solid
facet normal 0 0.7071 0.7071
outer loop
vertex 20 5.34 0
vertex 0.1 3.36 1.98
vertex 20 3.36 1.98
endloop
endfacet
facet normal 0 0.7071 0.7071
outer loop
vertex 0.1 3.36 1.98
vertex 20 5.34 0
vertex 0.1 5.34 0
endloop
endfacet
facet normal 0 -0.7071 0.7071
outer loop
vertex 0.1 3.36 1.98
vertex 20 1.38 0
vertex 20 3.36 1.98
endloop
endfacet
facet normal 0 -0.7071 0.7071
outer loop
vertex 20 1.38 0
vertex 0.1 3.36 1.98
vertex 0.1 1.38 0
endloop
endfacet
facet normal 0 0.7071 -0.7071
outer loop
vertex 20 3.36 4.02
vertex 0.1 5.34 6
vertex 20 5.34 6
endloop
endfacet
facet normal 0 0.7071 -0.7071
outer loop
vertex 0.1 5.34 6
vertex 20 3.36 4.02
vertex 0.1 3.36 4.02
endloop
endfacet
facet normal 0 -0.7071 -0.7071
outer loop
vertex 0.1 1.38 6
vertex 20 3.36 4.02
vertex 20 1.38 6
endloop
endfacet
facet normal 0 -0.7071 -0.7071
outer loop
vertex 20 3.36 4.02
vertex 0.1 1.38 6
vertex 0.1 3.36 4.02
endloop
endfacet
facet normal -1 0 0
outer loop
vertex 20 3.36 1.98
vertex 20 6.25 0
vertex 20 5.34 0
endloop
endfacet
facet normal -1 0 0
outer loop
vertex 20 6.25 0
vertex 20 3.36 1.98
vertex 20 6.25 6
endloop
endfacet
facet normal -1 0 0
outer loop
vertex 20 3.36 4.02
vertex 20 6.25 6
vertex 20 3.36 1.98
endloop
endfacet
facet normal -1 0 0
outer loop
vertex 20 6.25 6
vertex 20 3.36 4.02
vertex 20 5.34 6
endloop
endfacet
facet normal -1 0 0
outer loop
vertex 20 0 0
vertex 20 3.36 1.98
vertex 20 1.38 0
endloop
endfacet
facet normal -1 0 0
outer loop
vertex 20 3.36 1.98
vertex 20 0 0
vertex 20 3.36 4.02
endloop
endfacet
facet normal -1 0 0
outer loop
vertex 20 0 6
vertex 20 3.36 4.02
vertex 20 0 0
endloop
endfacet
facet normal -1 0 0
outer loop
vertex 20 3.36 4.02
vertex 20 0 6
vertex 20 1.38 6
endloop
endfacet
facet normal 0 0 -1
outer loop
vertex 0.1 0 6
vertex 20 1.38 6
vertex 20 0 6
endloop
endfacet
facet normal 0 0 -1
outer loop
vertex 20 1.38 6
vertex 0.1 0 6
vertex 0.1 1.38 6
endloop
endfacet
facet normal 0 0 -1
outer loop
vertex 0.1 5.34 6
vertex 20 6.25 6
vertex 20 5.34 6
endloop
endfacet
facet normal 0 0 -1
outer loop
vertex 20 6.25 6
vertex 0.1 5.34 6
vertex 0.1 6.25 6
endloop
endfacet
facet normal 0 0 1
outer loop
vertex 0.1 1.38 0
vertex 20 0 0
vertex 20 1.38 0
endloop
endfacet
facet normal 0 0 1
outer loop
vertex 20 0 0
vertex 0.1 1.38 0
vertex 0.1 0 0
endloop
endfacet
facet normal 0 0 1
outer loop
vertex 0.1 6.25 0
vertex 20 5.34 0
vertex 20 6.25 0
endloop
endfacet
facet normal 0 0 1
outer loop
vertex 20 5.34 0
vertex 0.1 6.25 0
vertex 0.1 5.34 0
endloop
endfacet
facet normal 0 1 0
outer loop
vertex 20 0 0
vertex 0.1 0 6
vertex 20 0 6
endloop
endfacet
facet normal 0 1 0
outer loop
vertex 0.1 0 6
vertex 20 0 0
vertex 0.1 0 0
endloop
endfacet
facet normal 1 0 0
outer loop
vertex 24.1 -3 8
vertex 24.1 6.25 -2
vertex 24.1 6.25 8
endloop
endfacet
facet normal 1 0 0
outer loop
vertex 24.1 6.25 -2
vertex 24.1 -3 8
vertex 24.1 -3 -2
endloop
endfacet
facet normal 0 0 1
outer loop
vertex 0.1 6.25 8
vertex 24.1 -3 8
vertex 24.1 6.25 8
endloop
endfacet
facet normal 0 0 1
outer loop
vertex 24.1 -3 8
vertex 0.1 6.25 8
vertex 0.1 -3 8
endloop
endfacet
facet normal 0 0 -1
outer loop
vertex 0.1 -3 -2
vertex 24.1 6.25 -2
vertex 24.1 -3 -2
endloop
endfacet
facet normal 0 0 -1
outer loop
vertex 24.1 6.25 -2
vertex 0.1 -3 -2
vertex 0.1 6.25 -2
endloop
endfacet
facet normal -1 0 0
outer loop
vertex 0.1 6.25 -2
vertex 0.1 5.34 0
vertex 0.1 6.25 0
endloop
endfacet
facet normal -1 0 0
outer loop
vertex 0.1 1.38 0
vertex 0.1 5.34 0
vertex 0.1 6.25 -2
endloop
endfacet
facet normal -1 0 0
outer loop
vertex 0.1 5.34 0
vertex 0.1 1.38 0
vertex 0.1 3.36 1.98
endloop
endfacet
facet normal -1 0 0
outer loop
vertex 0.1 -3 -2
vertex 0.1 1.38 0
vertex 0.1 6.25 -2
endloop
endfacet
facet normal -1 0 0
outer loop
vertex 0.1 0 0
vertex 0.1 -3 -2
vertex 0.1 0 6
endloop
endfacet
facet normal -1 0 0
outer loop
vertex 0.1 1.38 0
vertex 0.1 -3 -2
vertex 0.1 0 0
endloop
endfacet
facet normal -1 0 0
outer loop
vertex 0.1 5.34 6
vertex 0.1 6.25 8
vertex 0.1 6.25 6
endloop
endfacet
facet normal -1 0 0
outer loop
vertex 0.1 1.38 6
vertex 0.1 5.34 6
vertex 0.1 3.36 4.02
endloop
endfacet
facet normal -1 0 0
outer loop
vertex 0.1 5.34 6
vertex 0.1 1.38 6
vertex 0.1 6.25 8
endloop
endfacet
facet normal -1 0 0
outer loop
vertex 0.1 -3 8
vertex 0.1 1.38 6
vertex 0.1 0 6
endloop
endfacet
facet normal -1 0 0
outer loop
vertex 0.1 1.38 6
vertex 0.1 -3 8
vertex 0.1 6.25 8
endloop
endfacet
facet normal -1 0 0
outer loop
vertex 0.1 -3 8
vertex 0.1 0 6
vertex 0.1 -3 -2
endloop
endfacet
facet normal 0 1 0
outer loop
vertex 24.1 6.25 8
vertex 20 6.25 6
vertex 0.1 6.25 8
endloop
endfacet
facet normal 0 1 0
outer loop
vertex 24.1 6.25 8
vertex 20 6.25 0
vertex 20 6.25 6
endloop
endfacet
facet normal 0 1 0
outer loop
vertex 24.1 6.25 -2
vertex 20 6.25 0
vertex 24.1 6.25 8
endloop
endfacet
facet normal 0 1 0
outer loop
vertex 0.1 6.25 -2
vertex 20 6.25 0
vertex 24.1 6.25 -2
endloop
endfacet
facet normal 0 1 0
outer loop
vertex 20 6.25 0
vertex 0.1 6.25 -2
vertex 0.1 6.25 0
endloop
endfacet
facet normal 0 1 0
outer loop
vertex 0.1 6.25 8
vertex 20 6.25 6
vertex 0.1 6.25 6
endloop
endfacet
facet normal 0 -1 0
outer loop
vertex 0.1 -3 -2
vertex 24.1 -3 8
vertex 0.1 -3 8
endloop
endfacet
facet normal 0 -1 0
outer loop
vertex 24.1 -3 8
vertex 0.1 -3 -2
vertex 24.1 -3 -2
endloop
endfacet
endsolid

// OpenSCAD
$fn = 32;
WIDTH = 6;
LENGTH = 4.75;

module pegSection() {
  $fn = 32;
  rotate([0, 0, 90])
      offset(r = 2.35)
        offset(-2.35) 
          square([WIDTH, LENGTH]);
}

module pegBend(angle = 90, tx = 1) {
  rotate_extrude(angle = angle)
    translate([-tx, 0, 0])
      pegSection();
}

difference() {
  union() {
    rotate([90, 0, 90])
      linear_extrude(1)
        pegSection();

    translate([0, 2, 0]) {
      pegBend(tx = 2);
     
      translate([-LENGTH - 1 - 1, 0, 0]) {
        rotate([90, 0, 180])
          linear_extrude(5)
            pegSection();
        
        translate([-1, 5, 0]) {
          *rotate([0, 0, 180])                 
            pegBend();
          
          *translate([0, 1, 0]) 
            rotate([90, 0, 270])
              linear_extrude(18)
                pegSection();
          
          translate([1 - 21, 1 + LENGTH / 2, 0]) 
            rotate([90, 0, 0]) {
              difference() {
                translate([0,0,4.375])
                linear_extrude(11)
                  pegSection();
               
                translate([-LENGTH / 2, -1, 6])
                  rotate([90, 90, 180])
                    linear_extrude(10) 
                      polygon([
                        [0, 0],
                        [-10, 3],
                        [-10, -3] 
                      ]);
              }
              
              difference() {
                union() {
                  translate([-0.1, WIDTH / 2, 12.4])     
                    sphere(1.5);
                  
                  translate([-LENGTH + 0.1, WIDTH / 2, 12.4])
                    sphere(1.5);
                }
                
                translate([-LENGTH / 2, -1, 6])
                  rotate([90, 90, 180])
                    linear_extrude(10) 
                      polygon([
                        [0, 0],
                        [-10, 3],
                        [-10, -3] 
                      ]);
              }
              
              translate([2, WIDTH, LENGTH - .375])
                rotate([90, 0, 0])
                  pegBend(tx = 2);
            }
              
            
            
          *translate([-20, LENGTH + 4 + 1, 0]) {
            rotate([0, 0, 270])
              pegBend(180, 4);
            
            translate([0, LENGTH + 4, 0]) 
              rotate([90, 0, 90])
                linear_extrude(5)
                  pegSection();
          }
        }
      } 
    }

    translate([-32.5, 7, 0])
      cube([30.5, LENGTH + 2, WIDTH]);
  }
  
  mountSlicer(40, -38, 6.4); 
}

module mountSlicer(l = 20, tx = 0, ty = 0, cs = 2.8) {
  group() {
    translate([tx, ty + sqrt(2)*cs, - sqrt(2)*cs/2])
      rotate([45,0,0])cube([l, cs, cs]);

    translate([tx, ty + sqrt(2)*cs, WIDTH - sqrt(2)*cs/2])
      rotate([45,0,0]) cube([l, cs, cs]);  
  }
}

module fullMountSlicer(s = [20, 6.75, 6], tx = 0, ty = 0) {
  difference() {
    translate([tx, ty, 0])
      cube(s);
    
    translate([tx - 0.1, ty - 0.6, 0])
      mountSlicer(s[0] + 0.2, tx, ty);
  }
}


!difference() {
  translate([0.1, -3, -2]) 
    cube([24, LENGTH + 4.5, 10]); 

  fullMountSlicer();
}
